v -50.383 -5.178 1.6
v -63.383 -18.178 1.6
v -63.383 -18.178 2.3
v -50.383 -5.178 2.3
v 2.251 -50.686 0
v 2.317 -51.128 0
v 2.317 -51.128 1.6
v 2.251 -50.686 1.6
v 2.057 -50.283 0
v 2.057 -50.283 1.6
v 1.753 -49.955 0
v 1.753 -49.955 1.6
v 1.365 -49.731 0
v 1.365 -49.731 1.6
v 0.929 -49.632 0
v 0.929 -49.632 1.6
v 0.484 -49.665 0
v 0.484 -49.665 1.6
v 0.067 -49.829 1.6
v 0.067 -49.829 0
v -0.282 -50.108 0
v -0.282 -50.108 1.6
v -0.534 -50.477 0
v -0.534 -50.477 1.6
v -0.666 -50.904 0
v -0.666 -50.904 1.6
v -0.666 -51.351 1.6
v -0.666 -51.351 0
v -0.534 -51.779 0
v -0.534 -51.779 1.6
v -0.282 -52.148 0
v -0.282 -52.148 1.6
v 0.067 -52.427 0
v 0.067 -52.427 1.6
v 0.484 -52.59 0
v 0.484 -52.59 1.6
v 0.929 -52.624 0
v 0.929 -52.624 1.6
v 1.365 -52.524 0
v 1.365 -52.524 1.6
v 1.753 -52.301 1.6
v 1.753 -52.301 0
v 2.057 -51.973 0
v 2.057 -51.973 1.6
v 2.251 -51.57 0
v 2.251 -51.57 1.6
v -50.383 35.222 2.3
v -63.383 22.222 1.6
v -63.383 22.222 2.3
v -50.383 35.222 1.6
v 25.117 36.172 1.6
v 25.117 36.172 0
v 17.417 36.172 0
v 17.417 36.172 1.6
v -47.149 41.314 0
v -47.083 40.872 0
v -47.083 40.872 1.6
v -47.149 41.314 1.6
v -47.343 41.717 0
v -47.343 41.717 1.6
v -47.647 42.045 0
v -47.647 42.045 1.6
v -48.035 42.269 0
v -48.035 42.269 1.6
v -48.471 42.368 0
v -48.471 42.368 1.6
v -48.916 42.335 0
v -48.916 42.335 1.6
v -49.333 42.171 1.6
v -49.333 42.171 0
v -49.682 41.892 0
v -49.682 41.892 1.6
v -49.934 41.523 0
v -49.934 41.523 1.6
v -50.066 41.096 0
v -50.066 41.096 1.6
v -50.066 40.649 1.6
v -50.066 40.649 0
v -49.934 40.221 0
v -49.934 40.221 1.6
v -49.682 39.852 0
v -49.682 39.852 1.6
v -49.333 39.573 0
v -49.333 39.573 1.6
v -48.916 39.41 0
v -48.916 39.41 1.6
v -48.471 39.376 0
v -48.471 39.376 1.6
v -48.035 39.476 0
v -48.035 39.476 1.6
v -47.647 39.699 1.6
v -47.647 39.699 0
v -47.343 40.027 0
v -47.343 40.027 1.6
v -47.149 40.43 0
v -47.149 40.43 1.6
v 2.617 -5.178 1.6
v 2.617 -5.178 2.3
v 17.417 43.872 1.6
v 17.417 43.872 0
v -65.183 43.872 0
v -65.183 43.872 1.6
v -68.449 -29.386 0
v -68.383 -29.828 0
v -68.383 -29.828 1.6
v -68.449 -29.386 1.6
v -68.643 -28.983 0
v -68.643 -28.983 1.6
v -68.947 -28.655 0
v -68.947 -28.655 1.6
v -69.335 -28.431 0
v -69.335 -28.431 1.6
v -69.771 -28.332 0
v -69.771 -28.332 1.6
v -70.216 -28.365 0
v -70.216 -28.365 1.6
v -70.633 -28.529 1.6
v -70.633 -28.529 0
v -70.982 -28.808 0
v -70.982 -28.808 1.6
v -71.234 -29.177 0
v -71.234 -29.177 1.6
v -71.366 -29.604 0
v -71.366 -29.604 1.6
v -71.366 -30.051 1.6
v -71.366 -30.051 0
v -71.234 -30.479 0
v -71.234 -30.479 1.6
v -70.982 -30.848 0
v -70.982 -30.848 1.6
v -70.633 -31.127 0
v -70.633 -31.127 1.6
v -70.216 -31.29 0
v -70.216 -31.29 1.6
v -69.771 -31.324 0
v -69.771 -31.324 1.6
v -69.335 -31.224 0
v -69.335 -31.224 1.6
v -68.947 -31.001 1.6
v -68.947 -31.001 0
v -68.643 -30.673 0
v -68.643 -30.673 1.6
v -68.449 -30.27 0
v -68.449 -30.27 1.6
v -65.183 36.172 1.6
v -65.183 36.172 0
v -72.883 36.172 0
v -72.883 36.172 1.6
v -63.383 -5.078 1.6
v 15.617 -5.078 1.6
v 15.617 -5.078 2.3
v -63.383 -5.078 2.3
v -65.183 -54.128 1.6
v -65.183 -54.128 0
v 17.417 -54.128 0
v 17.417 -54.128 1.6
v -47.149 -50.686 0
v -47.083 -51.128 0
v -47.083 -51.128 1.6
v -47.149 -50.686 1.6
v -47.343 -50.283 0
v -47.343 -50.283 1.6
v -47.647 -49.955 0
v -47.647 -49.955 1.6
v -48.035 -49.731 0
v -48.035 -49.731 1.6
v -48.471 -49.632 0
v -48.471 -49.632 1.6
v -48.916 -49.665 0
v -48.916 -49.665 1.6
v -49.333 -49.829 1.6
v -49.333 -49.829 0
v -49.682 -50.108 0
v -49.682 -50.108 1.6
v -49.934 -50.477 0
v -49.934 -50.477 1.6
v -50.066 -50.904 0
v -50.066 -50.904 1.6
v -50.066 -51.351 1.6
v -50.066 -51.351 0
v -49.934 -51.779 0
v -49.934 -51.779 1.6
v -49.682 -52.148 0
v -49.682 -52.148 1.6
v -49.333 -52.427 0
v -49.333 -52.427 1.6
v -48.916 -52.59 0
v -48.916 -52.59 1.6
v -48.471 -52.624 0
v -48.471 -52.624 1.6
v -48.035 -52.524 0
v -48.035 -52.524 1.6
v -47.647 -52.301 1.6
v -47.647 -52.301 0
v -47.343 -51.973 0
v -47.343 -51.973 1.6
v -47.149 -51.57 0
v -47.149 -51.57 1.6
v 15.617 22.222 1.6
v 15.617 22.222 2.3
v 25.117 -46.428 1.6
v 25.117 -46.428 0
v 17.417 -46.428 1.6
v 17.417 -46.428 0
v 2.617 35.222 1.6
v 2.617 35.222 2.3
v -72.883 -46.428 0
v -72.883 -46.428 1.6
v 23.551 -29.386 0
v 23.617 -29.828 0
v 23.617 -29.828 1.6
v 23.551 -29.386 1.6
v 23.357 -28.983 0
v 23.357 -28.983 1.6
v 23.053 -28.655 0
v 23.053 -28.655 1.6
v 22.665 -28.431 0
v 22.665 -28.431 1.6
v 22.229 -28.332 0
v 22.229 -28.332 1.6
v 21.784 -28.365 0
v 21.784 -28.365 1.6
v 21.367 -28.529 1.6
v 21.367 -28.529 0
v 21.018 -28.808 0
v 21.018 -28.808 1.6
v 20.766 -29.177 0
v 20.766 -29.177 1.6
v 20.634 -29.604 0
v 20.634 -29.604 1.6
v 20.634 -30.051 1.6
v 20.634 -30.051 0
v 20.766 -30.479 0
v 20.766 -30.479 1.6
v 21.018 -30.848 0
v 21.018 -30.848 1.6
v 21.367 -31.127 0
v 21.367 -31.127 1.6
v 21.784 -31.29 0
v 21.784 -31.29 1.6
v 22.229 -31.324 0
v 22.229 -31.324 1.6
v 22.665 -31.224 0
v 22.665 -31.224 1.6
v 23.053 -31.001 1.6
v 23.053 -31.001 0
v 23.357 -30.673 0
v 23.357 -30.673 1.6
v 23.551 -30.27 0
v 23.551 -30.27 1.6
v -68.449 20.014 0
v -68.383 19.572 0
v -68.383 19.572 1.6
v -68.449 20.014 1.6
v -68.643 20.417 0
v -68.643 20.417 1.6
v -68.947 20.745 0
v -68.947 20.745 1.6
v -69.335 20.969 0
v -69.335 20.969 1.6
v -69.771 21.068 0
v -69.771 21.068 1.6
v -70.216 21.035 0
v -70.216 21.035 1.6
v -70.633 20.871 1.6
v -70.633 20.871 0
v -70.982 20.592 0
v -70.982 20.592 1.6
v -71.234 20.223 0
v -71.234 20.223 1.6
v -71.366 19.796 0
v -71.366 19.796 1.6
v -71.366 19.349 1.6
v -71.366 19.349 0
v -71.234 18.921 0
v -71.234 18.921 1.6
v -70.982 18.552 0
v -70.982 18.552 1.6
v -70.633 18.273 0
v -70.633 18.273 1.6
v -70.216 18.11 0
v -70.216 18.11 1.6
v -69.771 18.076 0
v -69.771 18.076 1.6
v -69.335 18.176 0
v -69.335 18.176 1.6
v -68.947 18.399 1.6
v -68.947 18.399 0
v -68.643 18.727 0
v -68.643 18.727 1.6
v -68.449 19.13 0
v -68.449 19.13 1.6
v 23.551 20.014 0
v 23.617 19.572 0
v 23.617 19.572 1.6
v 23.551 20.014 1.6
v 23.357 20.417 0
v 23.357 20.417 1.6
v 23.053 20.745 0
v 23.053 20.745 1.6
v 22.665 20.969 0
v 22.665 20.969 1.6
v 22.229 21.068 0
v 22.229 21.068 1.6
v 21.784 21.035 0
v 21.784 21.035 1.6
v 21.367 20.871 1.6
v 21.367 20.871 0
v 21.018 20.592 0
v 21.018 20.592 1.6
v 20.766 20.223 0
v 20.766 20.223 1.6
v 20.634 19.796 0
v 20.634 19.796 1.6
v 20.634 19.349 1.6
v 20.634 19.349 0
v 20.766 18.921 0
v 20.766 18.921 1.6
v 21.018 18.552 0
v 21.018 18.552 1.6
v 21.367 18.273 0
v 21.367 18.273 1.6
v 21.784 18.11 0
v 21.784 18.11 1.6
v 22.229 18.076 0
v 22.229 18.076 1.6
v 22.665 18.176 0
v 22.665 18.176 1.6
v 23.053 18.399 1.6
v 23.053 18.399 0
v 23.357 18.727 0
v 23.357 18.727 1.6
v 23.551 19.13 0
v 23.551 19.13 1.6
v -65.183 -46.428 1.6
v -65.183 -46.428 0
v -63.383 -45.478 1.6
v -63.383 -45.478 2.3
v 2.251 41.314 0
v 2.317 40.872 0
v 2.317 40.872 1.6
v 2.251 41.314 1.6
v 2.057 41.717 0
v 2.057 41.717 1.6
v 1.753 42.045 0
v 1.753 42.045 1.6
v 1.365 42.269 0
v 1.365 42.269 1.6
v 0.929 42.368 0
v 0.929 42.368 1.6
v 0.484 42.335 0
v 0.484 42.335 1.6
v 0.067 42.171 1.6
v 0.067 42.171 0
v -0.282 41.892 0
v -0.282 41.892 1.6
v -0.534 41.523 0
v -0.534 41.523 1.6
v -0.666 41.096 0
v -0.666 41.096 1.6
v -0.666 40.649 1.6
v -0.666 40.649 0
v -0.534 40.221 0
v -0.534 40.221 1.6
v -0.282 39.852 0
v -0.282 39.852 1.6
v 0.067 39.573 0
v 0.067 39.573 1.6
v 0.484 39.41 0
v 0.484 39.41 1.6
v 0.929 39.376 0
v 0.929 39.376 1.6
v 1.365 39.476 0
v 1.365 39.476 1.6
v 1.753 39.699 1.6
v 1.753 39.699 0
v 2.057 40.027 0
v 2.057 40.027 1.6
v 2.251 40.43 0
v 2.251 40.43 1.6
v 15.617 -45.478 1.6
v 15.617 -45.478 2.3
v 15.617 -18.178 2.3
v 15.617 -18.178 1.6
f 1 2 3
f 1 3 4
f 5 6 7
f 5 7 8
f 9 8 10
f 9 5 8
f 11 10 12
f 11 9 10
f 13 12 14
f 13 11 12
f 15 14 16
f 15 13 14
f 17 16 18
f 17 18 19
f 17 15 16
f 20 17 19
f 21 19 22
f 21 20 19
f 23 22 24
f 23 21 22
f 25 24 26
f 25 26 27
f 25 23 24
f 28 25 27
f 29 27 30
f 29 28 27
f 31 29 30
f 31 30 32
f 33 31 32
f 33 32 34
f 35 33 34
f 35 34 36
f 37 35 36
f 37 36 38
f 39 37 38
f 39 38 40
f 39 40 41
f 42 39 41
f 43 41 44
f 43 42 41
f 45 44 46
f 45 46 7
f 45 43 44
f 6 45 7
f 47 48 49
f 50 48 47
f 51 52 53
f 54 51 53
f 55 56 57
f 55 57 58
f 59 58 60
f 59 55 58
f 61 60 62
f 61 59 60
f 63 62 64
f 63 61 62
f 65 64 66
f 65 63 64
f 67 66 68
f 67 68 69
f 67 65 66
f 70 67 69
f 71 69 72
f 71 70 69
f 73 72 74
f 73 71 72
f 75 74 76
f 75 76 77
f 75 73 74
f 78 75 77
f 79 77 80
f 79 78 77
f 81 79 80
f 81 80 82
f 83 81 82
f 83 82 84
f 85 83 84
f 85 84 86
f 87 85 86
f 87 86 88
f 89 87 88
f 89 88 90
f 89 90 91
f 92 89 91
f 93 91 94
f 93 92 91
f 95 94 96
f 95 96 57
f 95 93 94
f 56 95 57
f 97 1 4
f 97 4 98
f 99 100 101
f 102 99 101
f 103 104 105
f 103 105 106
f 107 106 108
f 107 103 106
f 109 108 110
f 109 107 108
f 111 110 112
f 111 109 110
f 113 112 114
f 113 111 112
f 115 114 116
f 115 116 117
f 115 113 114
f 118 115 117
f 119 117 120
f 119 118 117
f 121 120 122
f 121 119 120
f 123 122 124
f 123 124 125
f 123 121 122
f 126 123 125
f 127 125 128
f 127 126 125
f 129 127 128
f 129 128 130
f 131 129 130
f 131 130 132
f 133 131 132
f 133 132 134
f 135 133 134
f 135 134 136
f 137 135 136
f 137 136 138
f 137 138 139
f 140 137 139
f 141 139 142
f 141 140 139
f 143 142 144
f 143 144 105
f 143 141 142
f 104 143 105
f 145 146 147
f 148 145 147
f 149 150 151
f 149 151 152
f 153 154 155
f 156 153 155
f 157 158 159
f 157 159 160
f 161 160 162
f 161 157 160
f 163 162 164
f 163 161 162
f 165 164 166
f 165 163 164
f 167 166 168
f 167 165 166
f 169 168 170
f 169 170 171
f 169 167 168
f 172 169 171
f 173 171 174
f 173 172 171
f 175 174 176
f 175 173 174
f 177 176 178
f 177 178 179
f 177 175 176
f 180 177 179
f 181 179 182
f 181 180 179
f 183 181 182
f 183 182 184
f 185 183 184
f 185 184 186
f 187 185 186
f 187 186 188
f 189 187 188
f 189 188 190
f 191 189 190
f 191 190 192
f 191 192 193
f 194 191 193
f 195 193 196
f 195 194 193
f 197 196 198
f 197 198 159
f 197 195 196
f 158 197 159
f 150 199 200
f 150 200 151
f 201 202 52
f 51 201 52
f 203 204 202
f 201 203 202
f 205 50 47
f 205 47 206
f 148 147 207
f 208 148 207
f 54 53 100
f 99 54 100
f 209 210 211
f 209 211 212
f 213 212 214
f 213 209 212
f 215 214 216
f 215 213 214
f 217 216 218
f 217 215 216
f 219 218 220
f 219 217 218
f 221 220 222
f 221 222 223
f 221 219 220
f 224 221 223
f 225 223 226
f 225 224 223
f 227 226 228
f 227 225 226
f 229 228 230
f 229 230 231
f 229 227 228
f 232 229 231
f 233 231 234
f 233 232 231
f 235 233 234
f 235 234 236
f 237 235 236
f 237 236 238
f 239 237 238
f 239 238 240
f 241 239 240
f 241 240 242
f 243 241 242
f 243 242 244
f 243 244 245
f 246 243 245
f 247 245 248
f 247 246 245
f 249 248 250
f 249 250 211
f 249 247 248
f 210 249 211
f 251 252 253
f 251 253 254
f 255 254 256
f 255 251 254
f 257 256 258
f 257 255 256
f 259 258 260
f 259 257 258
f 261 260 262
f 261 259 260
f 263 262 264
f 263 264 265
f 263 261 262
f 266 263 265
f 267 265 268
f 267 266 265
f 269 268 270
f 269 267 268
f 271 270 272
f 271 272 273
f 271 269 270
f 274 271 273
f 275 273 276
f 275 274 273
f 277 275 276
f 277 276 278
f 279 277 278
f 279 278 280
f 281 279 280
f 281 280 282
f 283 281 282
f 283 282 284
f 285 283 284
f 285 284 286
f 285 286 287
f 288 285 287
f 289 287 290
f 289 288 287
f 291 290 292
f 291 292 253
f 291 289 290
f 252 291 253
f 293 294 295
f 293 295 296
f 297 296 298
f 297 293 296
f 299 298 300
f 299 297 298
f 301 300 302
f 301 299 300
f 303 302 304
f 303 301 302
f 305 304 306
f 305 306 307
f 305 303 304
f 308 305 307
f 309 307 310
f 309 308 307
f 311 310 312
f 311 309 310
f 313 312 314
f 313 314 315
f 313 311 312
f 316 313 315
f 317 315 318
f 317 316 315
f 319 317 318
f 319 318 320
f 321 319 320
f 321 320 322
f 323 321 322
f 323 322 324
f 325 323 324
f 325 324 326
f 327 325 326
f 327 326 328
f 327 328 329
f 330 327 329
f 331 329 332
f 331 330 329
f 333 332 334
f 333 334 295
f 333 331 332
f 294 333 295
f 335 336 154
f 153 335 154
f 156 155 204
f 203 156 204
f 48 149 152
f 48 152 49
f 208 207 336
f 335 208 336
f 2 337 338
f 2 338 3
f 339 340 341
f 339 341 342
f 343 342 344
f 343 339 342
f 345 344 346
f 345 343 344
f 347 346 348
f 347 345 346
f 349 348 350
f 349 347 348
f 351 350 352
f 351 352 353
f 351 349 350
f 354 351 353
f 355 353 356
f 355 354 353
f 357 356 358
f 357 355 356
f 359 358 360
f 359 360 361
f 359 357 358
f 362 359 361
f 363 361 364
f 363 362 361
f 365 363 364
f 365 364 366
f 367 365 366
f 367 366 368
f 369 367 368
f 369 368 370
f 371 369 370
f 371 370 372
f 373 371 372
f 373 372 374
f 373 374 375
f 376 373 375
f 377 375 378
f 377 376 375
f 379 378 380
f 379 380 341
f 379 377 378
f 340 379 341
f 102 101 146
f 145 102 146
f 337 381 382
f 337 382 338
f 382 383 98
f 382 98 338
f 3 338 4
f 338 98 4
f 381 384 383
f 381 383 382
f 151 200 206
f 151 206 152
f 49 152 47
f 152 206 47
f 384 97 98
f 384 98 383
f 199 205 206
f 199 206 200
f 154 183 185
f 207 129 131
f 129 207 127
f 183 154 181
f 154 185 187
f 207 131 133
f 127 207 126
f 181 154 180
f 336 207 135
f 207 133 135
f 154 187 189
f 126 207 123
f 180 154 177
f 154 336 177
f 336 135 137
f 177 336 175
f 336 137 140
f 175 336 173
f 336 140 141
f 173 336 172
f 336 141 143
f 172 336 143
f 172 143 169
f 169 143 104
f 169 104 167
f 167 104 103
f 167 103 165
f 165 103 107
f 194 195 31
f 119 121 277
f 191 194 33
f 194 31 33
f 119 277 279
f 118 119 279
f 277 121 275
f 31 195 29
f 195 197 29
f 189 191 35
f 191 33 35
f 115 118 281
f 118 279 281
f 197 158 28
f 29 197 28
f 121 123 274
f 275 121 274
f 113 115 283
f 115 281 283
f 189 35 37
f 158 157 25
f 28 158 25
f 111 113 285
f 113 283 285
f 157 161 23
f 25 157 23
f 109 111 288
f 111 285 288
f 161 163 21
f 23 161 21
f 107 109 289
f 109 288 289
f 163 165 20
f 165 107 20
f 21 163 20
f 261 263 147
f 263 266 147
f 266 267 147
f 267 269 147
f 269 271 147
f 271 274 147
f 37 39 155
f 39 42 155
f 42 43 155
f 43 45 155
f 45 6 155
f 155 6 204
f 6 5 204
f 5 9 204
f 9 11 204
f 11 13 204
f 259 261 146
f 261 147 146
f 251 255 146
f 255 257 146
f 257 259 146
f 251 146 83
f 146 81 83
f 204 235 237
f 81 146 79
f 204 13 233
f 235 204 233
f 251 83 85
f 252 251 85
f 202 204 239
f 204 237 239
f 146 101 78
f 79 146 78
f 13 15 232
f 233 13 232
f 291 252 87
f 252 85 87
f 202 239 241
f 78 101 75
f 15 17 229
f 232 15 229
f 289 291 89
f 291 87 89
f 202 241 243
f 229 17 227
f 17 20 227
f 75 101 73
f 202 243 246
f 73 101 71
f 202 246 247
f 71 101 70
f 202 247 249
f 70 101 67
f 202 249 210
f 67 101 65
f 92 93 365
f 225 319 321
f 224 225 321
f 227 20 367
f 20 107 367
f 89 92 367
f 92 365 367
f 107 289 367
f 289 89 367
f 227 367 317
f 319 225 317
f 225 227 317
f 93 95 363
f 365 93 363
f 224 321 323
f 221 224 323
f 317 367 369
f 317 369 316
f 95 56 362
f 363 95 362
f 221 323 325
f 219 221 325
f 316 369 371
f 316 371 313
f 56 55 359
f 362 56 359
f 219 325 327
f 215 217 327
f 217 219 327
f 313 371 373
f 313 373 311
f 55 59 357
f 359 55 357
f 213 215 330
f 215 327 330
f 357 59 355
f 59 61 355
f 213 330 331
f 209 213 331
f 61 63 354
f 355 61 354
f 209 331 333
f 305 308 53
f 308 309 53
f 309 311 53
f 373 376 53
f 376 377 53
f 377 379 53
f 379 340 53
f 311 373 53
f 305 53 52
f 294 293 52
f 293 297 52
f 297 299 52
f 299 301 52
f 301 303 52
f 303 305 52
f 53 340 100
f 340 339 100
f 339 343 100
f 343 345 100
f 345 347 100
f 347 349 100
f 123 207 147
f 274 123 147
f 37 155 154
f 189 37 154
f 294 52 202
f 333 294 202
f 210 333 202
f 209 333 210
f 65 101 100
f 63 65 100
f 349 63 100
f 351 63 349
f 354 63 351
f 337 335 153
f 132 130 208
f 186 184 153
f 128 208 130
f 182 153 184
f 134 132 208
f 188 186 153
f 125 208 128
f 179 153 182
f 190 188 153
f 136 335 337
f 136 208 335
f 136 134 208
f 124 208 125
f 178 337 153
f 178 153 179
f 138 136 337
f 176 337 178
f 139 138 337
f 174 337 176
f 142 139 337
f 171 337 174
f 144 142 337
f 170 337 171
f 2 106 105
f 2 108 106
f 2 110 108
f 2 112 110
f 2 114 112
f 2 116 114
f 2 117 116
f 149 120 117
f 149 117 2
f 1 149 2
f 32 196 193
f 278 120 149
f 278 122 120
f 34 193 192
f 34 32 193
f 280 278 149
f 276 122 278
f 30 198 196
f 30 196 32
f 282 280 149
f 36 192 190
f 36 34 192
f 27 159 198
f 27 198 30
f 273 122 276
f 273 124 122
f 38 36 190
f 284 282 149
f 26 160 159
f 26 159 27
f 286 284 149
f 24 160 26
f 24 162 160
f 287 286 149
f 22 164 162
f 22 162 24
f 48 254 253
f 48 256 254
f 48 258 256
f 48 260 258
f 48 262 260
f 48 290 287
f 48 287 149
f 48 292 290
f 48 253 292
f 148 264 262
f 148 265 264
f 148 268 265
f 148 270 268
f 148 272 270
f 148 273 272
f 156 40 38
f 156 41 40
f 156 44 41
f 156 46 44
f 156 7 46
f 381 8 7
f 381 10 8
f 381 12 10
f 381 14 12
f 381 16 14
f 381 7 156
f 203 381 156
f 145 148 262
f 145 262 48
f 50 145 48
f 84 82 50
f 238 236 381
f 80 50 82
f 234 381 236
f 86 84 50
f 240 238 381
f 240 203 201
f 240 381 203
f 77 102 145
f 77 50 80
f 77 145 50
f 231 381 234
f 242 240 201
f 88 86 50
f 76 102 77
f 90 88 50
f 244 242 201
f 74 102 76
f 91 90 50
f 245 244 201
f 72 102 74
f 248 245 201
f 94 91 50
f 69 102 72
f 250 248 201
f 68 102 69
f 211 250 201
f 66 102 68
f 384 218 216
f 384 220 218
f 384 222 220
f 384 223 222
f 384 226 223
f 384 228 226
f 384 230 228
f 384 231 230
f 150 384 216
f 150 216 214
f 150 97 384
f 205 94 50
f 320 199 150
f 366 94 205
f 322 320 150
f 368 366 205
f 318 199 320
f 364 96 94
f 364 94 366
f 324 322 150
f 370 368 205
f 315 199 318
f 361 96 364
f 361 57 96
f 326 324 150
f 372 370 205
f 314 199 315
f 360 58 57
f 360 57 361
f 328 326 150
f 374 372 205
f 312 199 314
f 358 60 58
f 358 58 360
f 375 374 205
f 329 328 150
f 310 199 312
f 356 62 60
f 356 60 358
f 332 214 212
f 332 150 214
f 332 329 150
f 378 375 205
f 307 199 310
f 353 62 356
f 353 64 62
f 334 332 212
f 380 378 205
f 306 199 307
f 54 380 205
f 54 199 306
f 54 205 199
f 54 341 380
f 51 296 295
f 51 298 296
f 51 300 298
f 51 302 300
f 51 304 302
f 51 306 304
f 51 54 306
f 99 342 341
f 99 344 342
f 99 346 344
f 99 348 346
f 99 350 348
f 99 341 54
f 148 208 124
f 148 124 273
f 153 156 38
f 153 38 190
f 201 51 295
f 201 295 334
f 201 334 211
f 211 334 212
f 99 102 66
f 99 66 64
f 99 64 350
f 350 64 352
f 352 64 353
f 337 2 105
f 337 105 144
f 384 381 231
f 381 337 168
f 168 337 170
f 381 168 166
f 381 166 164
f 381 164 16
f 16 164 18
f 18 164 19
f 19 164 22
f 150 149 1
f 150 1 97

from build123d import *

# Parameters (mm, degrees)
SKETCH1_R           = 1.5
BOSS_EXTRUDE1_DEPTH = 1.6
BOSS_EXTRUDE2_DEPTH = 2.3


with BuildPart() as part:
    # Sketch1 → Boss-Extrude1 (new body)
    with BuildSketch(Plane.XY):
        Polygon((-65.182649766, 43.872204631), (-65.182649766, 36.172204631), (-72.882649766, 36.172204631), (-72.882649766, -46.427795369), (-65.182649766, -46.427795369), (-65.182649766, -54.127795369), (17.417350234, -54.127795369), (17.417350234, -46.427795369), (25.117350234, -46.427795369), (25.117350234, 36.172204631), (17.417350234, 36.172204631), (17.417350234, 43.872204631), align=None)
        with Locations((-69.882649766, 19.572204631)):
            Circle(SKETCH1_R, mode=Mode.SUBTRACT)
        with Locations((-69.882649766, -29.827795369)):
            Circle(SKETCH1_R, mode=Mode.SUBTRACT)
        with Locations((-48.582649766, -51.127795369)):
            Circle(SKETCH1_R, mode=Mode.SUBTRACT)
        with Locations((0.817350234, -51.127795369)):
            Circle(SKETCH1_R, mode=Mode.SUBTRACT)
        with Locations((22.117350234, -29.827795369)):
            Circle(SKETCH1_R, mode=Mode.SUBTRACT)
        with Locations((22.117350234, 19.572204631)):
            Circle(SKETCH1_R, mode=Mode.SUBTRACT)
        with Locations((0.817350234, 40.872204631)):
            Circle(SKETCH1_R, mode=Mode.SUBTRACT)
        with Locations((-48.582649766, 40.872204631)):
            Circle(SKETCH1_R, mode=Mode.SUBTRACT)
        Polygon((-63.382649766, 22.222204631), (-50.382649766, 35.222204631), (2.617350234, 35.222204631), (15.617350234, 22.222204631), (15.617350234, -5.077795369), (-63.382649766, -5.077795369), align=None, mode=Mode.SUBTRACT)
        Polygon((-63.382649766, -18.177795369), (-50.382649766, -5.177795369), (2.617350234, -5.177795369), (15.617350234, -18.177795369), (15.617350234, -45.477795369), (-63.382649766, -45.477795369), align=None, mode=Mode.SUBTRACT)
    extrude(amount=BOSS_EXTRUDE1_DEPTH)

    # Sketch1<3> → Boss-Extrude2 (add)
    with BuildSketch(Plane.XY):
        Polygon((-50.382649766, 35.222204631), (-63.382649766, 22.222204631), (-63.382649766, -5.077795369), (15.617350234, -5.077795369), (15.617350234, 22.222204631), (2.617350234, 35.222204631), align=None)
        Polygon((-50.382649766, -5.177795369), (-63.382649766, -18.177795369), (-63.382649766, -45.477795369), (15.617350234, -45.477795369), (15.617350234, -18.177795369), (2.617350234, -5.177795369), align=None)
    extrude(amount=BOSS_EXTRUDE2_DEPTH)


solid = part.part
